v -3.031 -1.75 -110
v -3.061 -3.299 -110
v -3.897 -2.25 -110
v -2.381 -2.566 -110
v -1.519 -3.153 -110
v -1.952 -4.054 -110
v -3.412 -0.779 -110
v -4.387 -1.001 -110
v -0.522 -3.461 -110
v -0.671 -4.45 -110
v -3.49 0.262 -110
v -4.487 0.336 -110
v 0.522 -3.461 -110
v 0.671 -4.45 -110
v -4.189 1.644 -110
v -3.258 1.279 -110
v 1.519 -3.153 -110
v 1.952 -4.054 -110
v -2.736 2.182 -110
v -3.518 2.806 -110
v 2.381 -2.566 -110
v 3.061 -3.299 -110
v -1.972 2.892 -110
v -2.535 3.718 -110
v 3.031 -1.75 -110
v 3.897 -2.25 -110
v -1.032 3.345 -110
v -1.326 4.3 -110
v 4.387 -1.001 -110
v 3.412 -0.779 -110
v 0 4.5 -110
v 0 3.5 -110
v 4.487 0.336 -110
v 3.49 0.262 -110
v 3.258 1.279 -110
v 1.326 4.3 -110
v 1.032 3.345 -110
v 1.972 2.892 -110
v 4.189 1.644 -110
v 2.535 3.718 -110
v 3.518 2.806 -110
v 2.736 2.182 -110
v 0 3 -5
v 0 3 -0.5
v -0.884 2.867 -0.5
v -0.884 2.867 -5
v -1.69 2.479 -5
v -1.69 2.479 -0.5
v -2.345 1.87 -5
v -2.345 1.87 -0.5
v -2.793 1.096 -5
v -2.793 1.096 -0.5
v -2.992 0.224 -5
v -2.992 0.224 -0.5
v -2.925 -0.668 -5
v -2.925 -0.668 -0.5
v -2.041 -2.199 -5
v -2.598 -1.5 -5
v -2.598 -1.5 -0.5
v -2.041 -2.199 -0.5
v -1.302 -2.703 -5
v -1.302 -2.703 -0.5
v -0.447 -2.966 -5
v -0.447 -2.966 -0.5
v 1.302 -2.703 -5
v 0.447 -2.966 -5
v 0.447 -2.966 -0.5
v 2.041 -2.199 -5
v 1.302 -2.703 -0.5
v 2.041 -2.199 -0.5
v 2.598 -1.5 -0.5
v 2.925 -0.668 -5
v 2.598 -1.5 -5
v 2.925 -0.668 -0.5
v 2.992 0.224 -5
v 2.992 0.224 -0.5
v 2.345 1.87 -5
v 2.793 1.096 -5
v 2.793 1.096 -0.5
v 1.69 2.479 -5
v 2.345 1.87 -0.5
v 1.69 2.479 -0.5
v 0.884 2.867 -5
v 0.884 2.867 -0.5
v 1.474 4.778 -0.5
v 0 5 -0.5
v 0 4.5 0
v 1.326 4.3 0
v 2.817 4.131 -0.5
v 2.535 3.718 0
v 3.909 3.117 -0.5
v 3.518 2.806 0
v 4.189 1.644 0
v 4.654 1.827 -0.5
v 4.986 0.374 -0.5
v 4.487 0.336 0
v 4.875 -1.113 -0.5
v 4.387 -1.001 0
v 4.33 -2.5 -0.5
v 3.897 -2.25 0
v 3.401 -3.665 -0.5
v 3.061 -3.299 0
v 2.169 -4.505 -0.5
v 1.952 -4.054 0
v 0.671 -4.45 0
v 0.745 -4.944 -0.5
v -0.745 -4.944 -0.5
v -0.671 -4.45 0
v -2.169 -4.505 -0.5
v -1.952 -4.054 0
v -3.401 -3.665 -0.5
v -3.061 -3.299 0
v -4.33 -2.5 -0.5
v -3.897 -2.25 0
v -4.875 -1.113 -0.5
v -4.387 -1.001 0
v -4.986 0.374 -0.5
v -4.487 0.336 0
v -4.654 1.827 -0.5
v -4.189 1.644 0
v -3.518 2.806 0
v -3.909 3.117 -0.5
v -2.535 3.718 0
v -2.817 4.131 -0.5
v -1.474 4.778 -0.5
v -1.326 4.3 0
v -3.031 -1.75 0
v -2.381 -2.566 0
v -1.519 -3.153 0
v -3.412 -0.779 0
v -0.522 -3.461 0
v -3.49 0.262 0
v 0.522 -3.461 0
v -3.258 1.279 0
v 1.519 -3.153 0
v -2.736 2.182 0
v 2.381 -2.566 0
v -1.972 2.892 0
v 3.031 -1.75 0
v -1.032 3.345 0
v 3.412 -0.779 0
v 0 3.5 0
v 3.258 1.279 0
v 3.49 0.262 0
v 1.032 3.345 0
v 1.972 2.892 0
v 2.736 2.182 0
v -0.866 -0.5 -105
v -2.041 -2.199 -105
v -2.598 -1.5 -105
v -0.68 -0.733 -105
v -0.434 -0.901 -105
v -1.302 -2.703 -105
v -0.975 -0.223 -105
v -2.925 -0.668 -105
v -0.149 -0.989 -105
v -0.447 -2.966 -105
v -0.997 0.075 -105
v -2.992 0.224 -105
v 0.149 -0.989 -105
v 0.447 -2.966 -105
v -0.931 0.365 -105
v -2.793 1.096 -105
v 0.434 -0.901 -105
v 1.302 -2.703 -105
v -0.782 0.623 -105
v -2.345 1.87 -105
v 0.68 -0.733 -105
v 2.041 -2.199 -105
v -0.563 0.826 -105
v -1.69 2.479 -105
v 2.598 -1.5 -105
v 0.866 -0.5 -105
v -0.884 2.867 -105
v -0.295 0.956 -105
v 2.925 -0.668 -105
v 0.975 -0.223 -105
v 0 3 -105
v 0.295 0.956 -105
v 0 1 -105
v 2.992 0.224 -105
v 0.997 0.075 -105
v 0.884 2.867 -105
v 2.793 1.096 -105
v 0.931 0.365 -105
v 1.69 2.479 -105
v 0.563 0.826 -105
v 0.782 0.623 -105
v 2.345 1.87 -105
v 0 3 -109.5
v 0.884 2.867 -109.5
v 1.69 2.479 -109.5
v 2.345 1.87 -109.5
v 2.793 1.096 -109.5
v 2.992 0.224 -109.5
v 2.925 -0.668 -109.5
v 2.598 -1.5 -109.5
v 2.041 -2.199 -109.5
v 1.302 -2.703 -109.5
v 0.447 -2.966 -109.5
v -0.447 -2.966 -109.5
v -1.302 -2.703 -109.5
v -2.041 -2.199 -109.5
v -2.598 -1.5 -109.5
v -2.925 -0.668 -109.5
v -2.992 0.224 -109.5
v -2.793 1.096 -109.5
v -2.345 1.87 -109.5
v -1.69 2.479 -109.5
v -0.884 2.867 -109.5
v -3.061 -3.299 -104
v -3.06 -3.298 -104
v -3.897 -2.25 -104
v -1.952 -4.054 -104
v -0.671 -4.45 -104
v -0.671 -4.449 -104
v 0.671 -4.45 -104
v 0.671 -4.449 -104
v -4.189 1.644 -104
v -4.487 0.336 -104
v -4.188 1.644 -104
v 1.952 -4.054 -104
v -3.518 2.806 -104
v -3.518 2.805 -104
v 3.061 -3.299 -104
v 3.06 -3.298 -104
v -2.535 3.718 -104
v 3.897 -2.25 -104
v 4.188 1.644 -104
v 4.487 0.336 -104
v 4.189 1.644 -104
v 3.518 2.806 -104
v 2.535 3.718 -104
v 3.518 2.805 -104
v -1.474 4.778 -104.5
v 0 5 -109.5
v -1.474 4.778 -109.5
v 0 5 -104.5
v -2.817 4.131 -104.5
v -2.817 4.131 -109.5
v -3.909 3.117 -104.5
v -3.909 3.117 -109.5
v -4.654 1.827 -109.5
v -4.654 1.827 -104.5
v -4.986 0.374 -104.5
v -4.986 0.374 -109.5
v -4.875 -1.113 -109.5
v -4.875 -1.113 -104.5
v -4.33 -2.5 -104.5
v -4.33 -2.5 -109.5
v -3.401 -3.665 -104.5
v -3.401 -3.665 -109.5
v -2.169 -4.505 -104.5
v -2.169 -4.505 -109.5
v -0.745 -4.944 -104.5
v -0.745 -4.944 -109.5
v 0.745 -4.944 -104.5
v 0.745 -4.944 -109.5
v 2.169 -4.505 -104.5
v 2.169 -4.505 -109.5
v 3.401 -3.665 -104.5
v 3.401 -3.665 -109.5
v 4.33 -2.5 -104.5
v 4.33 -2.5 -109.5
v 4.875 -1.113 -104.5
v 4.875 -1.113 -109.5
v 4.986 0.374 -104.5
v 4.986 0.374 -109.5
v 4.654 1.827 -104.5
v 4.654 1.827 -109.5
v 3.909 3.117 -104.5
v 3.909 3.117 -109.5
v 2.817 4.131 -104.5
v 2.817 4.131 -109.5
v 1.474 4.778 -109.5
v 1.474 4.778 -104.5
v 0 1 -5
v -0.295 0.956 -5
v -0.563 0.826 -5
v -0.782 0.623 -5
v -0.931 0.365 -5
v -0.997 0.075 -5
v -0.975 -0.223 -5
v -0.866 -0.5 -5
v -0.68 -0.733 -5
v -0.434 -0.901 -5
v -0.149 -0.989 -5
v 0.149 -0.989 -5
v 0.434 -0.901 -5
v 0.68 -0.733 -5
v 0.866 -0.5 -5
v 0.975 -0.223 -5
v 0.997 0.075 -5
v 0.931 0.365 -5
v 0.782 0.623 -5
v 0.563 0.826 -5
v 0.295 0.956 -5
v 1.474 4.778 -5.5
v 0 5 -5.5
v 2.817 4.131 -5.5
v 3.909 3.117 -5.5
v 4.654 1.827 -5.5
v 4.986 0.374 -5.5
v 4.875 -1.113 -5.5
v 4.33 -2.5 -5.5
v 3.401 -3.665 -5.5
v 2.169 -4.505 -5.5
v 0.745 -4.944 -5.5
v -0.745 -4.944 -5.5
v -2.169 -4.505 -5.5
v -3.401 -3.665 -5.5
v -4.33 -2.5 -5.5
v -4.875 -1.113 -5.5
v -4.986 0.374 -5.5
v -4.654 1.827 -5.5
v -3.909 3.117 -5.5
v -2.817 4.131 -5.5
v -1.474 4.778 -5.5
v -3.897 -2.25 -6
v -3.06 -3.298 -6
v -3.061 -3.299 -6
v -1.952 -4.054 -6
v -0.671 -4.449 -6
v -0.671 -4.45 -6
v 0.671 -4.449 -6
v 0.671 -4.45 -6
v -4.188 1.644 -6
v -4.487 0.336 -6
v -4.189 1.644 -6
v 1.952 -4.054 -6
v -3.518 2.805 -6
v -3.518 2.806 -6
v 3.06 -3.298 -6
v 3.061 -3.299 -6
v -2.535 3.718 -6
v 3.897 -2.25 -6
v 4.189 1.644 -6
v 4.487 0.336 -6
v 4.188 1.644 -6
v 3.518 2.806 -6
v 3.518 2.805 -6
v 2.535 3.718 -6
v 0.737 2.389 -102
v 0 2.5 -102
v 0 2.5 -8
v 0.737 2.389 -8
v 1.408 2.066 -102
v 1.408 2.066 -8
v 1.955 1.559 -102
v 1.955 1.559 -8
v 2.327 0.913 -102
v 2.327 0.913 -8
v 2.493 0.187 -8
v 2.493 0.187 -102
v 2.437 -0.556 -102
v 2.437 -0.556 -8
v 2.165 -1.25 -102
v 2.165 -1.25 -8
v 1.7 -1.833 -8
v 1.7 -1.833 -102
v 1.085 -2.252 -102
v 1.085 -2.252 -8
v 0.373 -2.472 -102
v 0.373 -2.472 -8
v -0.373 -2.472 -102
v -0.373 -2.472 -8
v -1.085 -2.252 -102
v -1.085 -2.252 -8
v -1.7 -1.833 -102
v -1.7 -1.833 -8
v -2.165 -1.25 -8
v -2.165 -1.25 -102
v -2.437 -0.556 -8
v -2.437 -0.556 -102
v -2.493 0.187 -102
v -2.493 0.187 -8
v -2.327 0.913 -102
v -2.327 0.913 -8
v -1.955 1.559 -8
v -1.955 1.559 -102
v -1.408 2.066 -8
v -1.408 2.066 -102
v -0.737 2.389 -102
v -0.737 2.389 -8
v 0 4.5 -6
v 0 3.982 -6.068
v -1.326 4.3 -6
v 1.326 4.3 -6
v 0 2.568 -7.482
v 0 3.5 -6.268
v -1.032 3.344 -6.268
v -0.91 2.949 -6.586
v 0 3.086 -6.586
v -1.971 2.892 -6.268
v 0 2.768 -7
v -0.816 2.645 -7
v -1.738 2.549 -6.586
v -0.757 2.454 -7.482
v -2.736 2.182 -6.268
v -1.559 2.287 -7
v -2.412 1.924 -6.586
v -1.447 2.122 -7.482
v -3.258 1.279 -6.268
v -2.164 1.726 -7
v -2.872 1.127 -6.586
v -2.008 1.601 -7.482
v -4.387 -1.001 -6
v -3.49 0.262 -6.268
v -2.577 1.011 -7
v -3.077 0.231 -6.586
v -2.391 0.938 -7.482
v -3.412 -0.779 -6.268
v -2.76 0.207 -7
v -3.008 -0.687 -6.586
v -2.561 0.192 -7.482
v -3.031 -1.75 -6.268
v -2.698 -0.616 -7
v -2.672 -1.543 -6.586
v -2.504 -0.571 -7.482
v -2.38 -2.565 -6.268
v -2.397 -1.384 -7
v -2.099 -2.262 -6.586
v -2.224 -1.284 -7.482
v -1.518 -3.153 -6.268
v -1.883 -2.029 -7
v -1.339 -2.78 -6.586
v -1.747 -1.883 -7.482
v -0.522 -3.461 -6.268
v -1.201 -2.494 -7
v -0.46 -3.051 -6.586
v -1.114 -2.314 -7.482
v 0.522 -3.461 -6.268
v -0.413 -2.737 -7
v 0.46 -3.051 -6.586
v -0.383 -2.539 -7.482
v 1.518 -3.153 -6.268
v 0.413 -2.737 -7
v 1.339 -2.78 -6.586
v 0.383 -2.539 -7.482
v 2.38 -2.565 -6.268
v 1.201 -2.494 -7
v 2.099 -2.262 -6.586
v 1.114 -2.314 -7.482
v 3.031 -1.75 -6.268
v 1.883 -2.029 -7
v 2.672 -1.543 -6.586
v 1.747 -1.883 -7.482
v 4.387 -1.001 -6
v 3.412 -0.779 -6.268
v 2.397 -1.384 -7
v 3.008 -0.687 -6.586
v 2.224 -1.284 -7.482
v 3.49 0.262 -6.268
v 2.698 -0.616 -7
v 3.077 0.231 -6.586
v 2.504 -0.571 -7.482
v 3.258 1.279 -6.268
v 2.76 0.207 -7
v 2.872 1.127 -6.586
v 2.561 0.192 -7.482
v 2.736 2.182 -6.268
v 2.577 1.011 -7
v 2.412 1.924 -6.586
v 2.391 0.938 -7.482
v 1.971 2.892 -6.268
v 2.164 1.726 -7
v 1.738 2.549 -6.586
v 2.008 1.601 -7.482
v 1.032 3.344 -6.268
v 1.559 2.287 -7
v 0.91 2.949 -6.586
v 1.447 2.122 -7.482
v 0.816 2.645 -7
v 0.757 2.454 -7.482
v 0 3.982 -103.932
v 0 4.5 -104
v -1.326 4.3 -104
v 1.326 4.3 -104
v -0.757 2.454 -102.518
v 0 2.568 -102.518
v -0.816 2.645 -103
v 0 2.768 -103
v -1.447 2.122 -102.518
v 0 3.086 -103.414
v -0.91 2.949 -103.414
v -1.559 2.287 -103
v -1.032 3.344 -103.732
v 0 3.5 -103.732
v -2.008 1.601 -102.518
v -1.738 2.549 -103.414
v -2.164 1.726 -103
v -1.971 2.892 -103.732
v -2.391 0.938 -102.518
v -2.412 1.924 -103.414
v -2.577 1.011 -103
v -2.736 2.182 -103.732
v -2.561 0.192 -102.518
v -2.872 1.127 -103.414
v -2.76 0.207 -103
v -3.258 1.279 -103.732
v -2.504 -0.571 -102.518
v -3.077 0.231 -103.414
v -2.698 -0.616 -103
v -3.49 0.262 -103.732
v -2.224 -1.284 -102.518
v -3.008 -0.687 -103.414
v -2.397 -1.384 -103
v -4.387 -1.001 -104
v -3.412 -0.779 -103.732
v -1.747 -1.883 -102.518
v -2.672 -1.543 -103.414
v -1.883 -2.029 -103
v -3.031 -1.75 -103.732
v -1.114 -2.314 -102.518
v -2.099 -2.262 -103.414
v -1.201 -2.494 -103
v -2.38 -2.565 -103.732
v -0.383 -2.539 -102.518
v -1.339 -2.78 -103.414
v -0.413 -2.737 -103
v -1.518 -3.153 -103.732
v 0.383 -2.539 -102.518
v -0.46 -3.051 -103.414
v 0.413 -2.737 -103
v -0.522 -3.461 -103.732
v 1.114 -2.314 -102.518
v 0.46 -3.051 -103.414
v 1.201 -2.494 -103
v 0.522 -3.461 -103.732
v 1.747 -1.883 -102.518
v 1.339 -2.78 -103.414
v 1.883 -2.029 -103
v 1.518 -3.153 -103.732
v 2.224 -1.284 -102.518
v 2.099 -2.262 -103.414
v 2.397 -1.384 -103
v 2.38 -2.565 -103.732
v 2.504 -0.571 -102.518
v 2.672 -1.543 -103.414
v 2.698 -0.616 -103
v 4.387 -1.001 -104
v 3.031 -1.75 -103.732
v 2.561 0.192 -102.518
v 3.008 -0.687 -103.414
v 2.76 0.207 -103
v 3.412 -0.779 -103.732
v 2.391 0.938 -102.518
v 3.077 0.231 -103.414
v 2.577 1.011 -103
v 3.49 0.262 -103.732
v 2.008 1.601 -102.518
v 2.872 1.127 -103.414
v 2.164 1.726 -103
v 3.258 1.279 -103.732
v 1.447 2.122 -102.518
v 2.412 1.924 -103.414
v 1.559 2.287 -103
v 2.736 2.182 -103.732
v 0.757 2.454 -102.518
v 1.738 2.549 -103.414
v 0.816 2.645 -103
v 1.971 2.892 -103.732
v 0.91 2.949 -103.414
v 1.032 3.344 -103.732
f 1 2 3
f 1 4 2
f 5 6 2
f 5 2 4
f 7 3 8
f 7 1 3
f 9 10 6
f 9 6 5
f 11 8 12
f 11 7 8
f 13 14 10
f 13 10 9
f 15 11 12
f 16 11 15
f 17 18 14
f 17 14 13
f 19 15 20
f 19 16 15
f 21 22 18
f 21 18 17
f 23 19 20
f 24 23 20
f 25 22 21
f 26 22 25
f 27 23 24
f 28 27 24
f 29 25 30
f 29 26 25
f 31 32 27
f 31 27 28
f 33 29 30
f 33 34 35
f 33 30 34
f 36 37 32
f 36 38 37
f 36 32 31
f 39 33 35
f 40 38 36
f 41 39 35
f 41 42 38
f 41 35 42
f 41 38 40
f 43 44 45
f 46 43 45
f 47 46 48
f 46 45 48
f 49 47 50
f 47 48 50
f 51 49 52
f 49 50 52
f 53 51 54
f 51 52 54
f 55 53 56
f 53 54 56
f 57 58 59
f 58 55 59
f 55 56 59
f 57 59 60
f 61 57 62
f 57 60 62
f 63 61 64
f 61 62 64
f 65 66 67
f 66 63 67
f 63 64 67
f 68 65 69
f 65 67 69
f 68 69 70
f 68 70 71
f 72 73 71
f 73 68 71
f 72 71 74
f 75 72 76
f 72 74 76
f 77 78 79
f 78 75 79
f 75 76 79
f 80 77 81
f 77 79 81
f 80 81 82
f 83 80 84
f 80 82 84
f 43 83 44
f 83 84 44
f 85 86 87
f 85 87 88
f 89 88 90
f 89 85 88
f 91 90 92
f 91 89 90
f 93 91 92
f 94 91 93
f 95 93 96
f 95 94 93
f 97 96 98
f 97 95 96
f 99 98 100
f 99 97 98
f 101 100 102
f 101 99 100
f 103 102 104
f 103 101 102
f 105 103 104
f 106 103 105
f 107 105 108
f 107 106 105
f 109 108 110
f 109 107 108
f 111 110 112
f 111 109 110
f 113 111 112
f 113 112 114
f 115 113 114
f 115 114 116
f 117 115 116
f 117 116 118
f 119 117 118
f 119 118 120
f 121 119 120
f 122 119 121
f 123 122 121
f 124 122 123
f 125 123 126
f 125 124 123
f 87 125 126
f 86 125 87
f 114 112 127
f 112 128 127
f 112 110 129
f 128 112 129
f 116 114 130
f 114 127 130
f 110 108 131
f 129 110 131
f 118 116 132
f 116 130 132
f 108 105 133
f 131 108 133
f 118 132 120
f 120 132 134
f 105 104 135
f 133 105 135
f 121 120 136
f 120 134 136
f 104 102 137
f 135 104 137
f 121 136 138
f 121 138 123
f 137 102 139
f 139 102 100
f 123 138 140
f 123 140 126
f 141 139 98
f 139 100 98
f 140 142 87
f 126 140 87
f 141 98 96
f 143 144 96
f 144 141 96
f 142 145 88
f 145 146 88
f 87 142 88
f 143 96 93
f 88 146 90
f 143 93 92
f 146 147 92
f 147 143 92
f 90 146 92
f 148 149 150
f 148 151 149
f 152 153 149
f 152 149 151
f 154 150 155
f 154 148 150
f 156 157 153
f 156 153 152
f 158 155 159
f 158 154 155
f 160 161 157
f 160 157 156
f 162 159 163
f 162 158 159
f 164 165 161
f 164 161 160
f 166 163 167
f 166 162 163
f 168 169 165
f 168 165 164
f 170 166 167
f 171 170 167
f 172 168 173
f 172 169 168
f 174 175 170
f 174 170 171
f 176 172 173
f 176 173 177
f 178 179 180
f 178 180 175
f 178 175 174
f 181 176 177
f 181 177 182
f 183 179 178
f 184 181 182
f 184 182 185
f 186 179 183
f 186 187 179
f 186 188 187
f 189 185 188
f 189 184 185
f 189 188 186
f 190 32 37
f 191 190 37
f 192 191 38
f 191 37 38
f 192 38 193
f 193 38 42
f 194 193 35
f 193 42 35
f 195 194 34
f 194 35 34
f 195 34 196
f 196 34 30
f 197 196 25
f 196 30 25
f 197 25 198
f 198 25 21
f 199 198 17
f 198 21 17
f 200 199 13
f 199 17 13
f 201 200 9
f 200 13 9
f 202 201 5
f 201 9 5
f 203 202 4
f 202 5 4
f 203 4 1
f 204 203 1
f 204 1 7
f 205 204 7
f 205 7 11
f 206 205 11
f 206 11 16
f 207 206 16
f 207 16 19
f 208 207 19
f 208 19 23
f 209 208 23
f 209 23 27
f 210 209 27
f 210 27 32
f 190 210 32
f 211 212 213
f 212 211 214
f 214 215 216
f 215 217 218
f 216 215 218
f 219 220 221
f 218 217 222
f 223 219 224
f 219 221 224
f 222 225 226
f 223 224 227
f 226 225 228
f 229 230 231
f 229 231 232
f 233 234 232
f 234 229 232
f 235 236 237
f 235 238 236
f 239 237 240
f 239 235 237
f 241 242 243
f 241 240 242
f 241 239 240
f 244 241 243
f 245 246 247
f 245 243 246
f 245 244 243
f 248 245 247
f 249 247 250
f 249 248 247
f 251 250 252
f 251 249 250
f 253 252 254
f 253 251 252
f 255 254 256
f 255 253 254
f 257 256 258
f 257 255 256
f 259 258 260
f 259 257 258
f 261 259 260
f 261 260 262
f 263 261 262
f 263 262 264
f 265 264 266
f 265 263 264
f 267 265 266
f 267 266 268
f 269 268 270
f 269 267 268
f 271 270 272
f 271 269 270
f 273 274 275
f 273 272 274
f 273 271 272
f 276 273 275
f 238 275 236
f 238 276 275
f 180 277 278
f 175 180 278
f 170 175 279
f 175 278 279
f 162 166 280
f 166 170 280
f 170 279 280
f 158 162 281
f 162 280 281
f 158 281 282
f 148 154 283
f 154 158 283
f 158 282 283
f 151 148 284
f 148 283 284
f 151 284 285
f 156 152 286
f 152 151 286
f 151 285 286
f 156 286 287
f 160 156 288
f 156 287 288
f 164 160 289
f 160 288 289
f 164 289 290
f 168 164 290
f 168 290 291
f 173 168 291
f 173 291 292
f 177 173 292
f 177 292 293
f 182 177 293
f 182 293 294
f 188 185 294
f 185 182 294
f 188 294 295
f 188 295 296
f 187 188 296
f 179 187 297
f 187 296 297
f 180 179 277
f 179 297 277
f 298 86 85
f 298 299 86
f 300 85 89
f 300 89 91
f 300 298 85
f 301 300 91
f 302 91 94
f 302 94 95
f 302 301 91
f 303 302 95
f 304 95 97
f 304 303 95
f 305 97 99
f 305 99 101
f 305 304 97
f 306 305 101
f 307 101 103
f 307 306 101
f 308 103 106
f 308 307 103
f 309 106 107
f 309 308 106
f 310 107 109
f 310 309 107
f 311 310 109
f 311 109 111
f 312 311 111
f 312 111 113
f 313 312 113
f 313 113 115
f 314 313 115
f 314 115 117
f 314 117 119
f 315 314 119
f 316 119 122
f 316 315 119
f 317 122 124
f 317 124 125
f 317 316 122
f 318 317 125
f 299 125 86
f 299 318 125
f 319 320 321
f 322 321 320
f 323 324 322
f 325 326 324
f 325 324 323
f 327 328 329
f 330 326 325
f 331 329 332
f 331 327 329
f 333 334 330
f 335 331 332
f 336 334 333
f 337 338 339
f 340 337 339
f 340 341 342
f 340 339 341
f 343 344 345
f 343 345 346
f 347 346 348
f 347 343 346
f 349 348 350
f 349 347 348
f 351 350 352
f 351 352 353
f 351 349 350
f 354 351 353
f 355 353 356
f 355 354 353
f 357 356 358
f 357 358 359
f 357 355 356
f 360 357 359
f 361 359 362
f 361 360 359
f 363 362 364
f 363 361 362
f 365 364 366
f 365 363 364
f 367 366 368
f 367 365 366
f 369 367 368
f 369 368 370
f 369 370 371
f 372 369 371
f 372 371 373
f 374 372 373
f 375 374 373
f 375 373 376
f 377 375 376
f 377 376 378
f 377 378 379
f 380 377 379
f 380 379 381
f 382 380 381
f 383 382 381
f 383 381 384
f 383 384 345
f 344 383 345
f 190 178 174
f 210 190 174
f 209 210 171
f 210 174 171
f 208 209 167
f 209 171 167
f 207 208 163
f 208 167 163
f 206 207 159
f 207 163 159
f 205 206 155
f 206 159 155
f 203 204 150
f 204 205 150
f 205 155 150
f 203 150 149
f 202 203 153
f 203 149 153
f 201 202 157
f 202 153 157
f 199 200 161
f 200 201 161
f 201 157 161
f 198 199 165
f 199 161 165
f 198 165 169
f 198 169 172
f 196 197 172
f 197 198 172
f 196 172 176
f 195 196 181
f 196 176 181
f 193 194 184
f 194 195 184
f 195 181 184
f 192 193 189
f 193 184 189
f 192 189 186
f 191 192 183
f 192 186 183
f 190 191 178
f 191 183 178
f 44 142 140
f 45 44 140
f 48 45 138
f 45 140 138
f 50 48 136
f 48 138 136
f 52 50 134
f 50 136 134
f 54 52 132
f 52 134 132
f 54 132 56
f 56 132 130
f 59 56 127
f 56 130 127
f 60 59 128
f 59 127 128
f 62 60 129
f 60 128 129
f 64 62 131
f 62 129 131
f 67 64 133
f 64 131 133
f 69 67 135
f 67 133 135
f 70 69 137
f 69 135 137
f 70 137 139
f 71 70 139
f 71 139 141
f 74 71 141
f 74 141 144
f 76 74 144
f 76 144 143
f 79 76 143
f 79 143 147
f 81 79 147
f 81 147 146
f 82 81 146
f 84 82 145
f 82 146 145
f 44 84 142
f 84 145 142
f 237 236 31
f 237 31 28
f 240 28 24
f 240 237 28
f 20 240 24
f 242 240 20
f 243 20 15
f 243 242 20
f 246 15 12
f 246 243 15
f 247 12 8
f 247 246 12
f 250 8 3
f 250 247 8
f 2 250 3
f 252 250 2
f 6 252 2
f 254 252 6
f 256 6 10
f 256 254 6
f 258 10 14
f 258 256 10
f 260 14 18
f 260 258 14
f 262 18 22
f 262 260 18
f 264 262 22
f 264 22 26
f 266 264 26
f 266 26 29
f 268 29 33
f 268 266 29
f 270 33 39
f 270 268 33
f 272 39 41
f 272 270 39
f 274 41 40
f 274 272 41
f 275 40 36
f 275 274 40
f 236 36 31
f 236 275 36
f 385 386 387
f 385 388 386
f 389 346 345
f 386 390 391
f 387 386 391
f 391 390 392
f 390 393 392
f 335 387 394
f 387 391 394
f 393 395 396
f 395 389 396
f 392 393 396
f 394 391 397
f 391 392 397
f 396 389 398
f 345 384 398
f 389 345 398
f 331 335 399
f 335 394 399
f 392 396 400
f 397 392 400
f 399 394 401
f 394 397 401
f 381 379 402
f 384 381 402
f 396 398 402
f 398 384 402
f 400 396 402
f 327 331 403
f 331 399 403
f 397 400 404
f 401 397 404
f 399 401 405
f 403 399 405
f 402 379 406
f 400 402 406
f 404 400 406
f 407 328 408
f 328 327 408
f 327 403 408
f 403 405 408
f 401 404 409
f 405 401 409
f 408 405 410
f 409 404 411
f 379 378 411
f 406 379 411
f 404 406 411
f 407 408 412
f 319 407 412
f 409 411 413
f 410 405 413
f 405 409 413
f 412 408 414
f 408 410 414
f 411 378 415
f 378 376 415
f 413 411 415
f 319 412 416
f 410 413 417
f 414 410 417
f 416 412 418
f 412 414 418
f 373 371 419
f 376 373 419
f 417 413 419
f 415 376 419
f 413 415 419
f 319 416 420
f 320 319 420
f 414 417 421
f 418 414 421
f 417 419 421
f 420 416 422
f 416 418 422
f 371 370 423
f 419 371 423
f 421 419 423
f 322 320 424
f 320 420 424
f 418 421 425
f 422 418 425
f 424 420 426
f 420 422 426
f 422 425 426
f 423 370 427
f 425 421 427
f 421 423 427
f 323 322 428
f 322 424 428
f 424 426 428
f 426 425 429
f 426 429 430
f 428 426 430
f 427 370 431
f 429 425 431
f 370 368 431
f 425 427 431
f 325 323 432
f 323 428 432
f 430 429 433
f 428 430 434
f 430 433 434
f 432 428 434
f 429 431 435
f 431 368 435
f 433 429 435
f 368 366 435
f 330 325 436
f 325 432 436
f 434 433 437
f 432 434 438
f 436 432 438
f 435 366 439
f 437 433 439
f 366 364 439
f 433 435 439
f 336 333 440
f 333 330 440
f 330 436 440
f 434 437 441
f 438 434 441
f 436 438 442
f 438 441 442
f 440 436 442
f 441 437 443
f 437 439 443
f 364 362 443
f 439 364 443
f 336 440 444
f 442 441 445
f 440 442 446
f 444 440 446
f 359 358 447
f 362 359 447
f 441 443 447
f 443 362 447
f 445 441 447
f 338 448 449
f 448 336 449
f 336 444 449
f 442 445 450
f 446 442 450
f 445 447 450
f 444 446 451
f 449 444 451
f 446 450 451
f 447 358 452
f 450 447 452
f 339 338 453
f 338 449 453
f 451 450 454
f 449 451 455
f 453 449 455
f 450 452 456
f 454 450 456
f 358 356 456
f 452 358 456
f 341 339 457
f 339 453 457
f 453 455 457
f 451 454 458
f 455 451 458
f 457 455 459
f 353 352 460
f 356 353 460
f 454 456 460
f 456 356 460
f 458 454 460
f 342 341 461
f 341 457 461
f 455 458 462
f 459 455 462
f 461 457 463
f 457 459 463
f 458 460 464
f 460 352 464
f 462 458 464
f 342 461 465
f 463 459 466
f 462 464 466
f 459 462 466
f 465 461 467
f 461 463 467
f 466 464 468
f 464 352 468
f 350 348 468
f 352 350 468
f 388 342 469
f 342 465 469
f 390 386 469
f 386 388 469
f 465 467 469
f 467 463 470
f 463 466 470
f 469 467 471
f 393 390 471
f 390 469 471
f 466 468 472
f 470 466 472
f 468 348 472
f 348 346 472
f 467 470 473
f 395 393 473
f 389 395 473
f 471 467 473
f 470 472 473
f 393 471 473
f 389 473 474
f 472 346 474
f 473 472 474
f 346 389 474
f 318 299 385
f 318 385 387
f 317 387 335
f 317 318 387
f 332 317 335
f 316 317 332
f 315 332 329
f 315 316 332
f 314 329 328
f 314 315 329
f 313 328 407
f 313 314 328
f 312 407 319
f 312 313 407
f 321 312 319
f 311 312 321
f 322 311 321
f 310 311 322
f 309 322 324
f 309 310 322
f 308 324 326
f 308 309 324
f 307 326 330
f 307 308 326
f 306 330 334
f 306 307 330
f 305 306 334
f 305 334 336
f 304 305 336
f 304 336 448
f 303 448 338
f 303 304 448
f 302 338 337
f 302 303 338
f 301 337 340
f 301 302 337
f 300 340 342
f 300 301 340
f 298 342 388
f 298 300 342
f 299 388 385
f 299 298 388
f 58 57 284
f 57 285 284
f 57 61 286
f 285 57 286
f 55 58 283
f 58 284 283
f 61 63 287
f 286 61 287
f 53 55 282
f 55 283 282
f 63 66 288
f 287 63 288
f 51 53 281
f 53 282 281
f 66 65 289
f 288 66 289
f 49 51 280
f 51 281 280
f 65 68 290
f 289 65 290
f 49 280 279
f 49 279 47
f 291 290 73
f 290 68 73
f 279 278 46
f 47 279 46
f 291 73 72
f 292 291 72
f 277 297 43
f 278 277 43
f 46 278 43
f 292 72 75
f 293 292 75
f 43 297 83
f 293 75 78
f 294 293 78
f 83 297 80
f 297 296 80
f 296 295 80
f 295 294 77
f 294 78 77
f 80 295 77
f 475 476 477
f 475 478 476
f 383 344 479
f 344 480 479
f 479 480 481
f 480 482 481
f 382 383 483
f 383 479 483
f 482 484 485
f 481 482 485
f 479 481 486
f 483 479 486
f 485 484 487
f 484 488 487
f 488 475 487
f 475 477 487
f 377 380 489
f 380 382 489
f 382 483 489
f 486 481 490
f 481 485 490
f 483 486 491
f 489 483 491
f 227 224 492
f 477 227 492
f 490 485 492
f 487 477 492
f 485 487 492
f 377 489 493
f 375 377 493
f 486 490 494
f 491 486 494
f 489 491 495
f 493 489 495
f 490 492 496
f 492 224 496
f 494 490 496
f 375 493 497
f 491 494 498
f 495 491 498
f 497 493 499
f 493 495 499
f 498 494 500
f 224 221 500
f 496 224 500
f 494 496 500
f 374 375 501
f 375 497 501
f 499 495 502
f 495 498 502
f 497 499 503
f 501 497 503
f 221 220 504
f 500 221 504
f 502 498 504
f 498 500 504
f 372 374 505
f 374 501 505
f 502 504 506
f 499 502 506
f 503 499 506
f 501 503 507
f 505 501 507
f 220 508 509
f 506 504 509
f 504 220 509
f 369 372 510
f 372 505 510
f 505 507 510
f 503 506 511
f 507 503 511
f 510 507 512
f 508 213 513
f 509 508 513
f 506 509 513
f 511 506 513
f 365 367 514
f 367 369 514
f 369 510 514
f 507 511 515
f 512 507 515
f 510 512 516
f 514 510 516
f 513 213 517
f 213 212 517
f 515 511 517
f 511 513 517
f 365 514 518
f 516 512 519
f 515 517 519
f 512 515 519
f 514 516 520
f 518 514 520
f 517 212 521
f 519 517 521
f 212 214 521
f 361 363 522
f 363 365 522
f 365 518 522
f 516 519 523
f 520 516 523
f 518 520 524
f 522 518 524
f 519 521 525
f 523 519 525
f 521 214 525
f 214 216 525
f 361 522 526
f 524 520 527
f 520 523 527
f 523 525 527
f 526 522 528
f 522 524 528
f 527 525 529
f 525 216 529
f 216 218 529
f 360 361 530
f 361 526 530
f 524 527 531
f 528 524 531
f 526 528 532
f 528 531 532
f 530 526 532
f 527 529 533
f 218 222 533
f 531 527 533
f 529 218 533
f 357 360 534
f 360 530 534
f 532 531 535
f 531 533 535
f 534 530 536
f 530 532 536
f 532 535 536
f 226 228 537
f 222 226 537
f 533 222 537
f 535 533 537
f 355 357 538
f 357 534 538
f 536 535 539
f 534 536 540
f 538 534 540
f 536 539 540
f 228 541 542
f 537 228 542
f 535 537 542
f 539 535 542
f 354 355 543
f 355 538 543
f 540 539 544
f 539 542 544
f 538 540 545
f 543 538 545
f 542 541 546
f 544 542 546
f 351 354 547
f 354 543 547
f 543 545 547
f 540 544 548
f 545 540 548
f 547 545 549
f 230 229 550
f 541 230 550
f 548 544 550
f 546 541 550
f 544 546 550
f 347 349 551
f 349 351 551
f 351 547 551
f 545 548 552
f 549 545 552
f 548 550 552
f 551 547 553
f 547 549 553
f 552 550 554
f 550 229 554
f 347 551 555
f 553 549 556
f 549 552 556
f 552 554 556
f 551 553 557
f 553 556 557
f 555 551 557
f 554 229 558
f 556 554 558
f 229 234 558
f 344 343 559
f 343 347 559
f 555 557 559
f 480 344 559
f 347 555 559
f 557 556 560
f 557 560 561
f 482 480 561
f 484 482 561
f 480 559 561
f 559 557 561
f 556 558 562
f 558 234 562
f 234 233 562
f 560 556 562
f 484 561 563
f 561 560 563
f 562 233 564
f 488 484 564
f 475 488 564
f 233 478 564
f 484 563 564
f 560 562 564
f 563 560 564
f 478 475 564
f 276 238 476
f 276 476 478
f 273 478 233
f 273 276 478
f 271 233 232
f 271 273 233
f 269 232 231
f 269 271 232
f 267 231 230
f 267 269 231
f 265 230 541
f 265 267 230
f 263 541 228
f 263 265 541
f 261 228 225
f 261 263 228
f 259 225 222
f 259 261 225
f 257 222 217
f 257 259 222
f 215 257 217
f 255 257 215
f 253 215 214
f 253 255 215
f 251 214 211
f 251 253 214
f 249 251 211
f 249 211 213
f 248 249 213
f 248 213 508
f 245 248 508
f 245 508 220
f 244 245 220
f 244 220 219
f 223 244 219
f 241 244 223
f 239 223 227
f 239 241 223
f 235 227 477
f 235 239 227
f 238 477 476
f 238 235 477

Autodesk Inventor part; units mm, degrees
ref_plane "YZ Plane" through (0, 0, 0) normal (1, 0, 0) x (0, 1, 0)
ref_plane "XZ Plane" through (0, 0, 0) normal (0, 1, 0) x (-1, 0, 0)
ref_plane "XY Plane" through (0, 0, 0) normal (0, 0, 1) x (1, 0, 0)
sketch "Sketch1" plane through (0, 0, 0) normal (1, 0, 0) x (0, 1, 0)
  line L0 (0, 0) -> (0, -110)
  line L1 (0, -110) -> (3, -110)
  line L2 (3, -110) -> (3, 0)
  line L3 (3, 0) -> (0, 0)
  line L4 (3, 0) -> (3, -5)
  line L5 (3, -110) -> (3, -105)
  line L6 (3, -110) -> (5, -110)
  line L7 (5, -110) -> (5, -105)
  line L8 (5, -105) -> (3, -105)
  line L9 (3, 0) -> (5, 0)
  line L10 (5, 0) -> (5, -5)
  line L11 (5, -5) -> (3, -5)
  line L12 (3, -105) -> (1, -105)
  line L13 (1, -105) -> (1, -5)
  line L14 (1, -5) -> (3, -5)
  line L15 (5, -5) -> (5, -6)
  line L16 (5, -6) -> (1, -6)
  line L17 (5, -105) -> (5, -104)
  line L18 (5, -104) -> (1, -104)
  line L19 (3, -6) -> (3.1, -6)
  line L20 (2.5, -6) -> (2.5, -104)
  point P0 (3, -104)
  point P1 (2, -6)
  point P2 (3.1, -104)
  dimension "d0" = 110
  dimension "d1" = 3
  dimension "d2" = 5
  dimension "d3" = 5
  dimension "d5" = 2
  dimension "d6" = 2
  dimension "d7" = 2
  dimension "d8" = 1
  dimension "d9" = 1
  dimension "d22" = 1.5
revolve "Revolution1" add sketch "Sketch1" angle 360 about axis through (0, 0, 0) along (0, 0, -1) contours L9 L10 L11 L2 | L2 L8 L7 L6 | L11 L15 L16 L2 | L2 L16 L13 L14 | L12 L13 L18 L2 | L2 L18 L17 L8 | L20 L18 L13 L16
thread "Thread1" size "M6x1" class "6H" standard "ANSI Metric M Profile" full length
thread "Thread2" size "M6x1" class "6H" standard "ANSI Metric M Profile" full length
chamfer "Chamfer1" distance 0.5 angle 45 2 edges at (0, -3, 0) (0, -3, -110)
chamfer "Chamfer2" distance 0.5 angle 45 4 edges at (0, -5, -110) (0, -5, -104) (0, -5, -6) (0, -5, 0)
fillet "Fillet1" radius 2 2 edges at (0, -2.5, -104) (0, -2.5, -6)
properties part number "Heater"
